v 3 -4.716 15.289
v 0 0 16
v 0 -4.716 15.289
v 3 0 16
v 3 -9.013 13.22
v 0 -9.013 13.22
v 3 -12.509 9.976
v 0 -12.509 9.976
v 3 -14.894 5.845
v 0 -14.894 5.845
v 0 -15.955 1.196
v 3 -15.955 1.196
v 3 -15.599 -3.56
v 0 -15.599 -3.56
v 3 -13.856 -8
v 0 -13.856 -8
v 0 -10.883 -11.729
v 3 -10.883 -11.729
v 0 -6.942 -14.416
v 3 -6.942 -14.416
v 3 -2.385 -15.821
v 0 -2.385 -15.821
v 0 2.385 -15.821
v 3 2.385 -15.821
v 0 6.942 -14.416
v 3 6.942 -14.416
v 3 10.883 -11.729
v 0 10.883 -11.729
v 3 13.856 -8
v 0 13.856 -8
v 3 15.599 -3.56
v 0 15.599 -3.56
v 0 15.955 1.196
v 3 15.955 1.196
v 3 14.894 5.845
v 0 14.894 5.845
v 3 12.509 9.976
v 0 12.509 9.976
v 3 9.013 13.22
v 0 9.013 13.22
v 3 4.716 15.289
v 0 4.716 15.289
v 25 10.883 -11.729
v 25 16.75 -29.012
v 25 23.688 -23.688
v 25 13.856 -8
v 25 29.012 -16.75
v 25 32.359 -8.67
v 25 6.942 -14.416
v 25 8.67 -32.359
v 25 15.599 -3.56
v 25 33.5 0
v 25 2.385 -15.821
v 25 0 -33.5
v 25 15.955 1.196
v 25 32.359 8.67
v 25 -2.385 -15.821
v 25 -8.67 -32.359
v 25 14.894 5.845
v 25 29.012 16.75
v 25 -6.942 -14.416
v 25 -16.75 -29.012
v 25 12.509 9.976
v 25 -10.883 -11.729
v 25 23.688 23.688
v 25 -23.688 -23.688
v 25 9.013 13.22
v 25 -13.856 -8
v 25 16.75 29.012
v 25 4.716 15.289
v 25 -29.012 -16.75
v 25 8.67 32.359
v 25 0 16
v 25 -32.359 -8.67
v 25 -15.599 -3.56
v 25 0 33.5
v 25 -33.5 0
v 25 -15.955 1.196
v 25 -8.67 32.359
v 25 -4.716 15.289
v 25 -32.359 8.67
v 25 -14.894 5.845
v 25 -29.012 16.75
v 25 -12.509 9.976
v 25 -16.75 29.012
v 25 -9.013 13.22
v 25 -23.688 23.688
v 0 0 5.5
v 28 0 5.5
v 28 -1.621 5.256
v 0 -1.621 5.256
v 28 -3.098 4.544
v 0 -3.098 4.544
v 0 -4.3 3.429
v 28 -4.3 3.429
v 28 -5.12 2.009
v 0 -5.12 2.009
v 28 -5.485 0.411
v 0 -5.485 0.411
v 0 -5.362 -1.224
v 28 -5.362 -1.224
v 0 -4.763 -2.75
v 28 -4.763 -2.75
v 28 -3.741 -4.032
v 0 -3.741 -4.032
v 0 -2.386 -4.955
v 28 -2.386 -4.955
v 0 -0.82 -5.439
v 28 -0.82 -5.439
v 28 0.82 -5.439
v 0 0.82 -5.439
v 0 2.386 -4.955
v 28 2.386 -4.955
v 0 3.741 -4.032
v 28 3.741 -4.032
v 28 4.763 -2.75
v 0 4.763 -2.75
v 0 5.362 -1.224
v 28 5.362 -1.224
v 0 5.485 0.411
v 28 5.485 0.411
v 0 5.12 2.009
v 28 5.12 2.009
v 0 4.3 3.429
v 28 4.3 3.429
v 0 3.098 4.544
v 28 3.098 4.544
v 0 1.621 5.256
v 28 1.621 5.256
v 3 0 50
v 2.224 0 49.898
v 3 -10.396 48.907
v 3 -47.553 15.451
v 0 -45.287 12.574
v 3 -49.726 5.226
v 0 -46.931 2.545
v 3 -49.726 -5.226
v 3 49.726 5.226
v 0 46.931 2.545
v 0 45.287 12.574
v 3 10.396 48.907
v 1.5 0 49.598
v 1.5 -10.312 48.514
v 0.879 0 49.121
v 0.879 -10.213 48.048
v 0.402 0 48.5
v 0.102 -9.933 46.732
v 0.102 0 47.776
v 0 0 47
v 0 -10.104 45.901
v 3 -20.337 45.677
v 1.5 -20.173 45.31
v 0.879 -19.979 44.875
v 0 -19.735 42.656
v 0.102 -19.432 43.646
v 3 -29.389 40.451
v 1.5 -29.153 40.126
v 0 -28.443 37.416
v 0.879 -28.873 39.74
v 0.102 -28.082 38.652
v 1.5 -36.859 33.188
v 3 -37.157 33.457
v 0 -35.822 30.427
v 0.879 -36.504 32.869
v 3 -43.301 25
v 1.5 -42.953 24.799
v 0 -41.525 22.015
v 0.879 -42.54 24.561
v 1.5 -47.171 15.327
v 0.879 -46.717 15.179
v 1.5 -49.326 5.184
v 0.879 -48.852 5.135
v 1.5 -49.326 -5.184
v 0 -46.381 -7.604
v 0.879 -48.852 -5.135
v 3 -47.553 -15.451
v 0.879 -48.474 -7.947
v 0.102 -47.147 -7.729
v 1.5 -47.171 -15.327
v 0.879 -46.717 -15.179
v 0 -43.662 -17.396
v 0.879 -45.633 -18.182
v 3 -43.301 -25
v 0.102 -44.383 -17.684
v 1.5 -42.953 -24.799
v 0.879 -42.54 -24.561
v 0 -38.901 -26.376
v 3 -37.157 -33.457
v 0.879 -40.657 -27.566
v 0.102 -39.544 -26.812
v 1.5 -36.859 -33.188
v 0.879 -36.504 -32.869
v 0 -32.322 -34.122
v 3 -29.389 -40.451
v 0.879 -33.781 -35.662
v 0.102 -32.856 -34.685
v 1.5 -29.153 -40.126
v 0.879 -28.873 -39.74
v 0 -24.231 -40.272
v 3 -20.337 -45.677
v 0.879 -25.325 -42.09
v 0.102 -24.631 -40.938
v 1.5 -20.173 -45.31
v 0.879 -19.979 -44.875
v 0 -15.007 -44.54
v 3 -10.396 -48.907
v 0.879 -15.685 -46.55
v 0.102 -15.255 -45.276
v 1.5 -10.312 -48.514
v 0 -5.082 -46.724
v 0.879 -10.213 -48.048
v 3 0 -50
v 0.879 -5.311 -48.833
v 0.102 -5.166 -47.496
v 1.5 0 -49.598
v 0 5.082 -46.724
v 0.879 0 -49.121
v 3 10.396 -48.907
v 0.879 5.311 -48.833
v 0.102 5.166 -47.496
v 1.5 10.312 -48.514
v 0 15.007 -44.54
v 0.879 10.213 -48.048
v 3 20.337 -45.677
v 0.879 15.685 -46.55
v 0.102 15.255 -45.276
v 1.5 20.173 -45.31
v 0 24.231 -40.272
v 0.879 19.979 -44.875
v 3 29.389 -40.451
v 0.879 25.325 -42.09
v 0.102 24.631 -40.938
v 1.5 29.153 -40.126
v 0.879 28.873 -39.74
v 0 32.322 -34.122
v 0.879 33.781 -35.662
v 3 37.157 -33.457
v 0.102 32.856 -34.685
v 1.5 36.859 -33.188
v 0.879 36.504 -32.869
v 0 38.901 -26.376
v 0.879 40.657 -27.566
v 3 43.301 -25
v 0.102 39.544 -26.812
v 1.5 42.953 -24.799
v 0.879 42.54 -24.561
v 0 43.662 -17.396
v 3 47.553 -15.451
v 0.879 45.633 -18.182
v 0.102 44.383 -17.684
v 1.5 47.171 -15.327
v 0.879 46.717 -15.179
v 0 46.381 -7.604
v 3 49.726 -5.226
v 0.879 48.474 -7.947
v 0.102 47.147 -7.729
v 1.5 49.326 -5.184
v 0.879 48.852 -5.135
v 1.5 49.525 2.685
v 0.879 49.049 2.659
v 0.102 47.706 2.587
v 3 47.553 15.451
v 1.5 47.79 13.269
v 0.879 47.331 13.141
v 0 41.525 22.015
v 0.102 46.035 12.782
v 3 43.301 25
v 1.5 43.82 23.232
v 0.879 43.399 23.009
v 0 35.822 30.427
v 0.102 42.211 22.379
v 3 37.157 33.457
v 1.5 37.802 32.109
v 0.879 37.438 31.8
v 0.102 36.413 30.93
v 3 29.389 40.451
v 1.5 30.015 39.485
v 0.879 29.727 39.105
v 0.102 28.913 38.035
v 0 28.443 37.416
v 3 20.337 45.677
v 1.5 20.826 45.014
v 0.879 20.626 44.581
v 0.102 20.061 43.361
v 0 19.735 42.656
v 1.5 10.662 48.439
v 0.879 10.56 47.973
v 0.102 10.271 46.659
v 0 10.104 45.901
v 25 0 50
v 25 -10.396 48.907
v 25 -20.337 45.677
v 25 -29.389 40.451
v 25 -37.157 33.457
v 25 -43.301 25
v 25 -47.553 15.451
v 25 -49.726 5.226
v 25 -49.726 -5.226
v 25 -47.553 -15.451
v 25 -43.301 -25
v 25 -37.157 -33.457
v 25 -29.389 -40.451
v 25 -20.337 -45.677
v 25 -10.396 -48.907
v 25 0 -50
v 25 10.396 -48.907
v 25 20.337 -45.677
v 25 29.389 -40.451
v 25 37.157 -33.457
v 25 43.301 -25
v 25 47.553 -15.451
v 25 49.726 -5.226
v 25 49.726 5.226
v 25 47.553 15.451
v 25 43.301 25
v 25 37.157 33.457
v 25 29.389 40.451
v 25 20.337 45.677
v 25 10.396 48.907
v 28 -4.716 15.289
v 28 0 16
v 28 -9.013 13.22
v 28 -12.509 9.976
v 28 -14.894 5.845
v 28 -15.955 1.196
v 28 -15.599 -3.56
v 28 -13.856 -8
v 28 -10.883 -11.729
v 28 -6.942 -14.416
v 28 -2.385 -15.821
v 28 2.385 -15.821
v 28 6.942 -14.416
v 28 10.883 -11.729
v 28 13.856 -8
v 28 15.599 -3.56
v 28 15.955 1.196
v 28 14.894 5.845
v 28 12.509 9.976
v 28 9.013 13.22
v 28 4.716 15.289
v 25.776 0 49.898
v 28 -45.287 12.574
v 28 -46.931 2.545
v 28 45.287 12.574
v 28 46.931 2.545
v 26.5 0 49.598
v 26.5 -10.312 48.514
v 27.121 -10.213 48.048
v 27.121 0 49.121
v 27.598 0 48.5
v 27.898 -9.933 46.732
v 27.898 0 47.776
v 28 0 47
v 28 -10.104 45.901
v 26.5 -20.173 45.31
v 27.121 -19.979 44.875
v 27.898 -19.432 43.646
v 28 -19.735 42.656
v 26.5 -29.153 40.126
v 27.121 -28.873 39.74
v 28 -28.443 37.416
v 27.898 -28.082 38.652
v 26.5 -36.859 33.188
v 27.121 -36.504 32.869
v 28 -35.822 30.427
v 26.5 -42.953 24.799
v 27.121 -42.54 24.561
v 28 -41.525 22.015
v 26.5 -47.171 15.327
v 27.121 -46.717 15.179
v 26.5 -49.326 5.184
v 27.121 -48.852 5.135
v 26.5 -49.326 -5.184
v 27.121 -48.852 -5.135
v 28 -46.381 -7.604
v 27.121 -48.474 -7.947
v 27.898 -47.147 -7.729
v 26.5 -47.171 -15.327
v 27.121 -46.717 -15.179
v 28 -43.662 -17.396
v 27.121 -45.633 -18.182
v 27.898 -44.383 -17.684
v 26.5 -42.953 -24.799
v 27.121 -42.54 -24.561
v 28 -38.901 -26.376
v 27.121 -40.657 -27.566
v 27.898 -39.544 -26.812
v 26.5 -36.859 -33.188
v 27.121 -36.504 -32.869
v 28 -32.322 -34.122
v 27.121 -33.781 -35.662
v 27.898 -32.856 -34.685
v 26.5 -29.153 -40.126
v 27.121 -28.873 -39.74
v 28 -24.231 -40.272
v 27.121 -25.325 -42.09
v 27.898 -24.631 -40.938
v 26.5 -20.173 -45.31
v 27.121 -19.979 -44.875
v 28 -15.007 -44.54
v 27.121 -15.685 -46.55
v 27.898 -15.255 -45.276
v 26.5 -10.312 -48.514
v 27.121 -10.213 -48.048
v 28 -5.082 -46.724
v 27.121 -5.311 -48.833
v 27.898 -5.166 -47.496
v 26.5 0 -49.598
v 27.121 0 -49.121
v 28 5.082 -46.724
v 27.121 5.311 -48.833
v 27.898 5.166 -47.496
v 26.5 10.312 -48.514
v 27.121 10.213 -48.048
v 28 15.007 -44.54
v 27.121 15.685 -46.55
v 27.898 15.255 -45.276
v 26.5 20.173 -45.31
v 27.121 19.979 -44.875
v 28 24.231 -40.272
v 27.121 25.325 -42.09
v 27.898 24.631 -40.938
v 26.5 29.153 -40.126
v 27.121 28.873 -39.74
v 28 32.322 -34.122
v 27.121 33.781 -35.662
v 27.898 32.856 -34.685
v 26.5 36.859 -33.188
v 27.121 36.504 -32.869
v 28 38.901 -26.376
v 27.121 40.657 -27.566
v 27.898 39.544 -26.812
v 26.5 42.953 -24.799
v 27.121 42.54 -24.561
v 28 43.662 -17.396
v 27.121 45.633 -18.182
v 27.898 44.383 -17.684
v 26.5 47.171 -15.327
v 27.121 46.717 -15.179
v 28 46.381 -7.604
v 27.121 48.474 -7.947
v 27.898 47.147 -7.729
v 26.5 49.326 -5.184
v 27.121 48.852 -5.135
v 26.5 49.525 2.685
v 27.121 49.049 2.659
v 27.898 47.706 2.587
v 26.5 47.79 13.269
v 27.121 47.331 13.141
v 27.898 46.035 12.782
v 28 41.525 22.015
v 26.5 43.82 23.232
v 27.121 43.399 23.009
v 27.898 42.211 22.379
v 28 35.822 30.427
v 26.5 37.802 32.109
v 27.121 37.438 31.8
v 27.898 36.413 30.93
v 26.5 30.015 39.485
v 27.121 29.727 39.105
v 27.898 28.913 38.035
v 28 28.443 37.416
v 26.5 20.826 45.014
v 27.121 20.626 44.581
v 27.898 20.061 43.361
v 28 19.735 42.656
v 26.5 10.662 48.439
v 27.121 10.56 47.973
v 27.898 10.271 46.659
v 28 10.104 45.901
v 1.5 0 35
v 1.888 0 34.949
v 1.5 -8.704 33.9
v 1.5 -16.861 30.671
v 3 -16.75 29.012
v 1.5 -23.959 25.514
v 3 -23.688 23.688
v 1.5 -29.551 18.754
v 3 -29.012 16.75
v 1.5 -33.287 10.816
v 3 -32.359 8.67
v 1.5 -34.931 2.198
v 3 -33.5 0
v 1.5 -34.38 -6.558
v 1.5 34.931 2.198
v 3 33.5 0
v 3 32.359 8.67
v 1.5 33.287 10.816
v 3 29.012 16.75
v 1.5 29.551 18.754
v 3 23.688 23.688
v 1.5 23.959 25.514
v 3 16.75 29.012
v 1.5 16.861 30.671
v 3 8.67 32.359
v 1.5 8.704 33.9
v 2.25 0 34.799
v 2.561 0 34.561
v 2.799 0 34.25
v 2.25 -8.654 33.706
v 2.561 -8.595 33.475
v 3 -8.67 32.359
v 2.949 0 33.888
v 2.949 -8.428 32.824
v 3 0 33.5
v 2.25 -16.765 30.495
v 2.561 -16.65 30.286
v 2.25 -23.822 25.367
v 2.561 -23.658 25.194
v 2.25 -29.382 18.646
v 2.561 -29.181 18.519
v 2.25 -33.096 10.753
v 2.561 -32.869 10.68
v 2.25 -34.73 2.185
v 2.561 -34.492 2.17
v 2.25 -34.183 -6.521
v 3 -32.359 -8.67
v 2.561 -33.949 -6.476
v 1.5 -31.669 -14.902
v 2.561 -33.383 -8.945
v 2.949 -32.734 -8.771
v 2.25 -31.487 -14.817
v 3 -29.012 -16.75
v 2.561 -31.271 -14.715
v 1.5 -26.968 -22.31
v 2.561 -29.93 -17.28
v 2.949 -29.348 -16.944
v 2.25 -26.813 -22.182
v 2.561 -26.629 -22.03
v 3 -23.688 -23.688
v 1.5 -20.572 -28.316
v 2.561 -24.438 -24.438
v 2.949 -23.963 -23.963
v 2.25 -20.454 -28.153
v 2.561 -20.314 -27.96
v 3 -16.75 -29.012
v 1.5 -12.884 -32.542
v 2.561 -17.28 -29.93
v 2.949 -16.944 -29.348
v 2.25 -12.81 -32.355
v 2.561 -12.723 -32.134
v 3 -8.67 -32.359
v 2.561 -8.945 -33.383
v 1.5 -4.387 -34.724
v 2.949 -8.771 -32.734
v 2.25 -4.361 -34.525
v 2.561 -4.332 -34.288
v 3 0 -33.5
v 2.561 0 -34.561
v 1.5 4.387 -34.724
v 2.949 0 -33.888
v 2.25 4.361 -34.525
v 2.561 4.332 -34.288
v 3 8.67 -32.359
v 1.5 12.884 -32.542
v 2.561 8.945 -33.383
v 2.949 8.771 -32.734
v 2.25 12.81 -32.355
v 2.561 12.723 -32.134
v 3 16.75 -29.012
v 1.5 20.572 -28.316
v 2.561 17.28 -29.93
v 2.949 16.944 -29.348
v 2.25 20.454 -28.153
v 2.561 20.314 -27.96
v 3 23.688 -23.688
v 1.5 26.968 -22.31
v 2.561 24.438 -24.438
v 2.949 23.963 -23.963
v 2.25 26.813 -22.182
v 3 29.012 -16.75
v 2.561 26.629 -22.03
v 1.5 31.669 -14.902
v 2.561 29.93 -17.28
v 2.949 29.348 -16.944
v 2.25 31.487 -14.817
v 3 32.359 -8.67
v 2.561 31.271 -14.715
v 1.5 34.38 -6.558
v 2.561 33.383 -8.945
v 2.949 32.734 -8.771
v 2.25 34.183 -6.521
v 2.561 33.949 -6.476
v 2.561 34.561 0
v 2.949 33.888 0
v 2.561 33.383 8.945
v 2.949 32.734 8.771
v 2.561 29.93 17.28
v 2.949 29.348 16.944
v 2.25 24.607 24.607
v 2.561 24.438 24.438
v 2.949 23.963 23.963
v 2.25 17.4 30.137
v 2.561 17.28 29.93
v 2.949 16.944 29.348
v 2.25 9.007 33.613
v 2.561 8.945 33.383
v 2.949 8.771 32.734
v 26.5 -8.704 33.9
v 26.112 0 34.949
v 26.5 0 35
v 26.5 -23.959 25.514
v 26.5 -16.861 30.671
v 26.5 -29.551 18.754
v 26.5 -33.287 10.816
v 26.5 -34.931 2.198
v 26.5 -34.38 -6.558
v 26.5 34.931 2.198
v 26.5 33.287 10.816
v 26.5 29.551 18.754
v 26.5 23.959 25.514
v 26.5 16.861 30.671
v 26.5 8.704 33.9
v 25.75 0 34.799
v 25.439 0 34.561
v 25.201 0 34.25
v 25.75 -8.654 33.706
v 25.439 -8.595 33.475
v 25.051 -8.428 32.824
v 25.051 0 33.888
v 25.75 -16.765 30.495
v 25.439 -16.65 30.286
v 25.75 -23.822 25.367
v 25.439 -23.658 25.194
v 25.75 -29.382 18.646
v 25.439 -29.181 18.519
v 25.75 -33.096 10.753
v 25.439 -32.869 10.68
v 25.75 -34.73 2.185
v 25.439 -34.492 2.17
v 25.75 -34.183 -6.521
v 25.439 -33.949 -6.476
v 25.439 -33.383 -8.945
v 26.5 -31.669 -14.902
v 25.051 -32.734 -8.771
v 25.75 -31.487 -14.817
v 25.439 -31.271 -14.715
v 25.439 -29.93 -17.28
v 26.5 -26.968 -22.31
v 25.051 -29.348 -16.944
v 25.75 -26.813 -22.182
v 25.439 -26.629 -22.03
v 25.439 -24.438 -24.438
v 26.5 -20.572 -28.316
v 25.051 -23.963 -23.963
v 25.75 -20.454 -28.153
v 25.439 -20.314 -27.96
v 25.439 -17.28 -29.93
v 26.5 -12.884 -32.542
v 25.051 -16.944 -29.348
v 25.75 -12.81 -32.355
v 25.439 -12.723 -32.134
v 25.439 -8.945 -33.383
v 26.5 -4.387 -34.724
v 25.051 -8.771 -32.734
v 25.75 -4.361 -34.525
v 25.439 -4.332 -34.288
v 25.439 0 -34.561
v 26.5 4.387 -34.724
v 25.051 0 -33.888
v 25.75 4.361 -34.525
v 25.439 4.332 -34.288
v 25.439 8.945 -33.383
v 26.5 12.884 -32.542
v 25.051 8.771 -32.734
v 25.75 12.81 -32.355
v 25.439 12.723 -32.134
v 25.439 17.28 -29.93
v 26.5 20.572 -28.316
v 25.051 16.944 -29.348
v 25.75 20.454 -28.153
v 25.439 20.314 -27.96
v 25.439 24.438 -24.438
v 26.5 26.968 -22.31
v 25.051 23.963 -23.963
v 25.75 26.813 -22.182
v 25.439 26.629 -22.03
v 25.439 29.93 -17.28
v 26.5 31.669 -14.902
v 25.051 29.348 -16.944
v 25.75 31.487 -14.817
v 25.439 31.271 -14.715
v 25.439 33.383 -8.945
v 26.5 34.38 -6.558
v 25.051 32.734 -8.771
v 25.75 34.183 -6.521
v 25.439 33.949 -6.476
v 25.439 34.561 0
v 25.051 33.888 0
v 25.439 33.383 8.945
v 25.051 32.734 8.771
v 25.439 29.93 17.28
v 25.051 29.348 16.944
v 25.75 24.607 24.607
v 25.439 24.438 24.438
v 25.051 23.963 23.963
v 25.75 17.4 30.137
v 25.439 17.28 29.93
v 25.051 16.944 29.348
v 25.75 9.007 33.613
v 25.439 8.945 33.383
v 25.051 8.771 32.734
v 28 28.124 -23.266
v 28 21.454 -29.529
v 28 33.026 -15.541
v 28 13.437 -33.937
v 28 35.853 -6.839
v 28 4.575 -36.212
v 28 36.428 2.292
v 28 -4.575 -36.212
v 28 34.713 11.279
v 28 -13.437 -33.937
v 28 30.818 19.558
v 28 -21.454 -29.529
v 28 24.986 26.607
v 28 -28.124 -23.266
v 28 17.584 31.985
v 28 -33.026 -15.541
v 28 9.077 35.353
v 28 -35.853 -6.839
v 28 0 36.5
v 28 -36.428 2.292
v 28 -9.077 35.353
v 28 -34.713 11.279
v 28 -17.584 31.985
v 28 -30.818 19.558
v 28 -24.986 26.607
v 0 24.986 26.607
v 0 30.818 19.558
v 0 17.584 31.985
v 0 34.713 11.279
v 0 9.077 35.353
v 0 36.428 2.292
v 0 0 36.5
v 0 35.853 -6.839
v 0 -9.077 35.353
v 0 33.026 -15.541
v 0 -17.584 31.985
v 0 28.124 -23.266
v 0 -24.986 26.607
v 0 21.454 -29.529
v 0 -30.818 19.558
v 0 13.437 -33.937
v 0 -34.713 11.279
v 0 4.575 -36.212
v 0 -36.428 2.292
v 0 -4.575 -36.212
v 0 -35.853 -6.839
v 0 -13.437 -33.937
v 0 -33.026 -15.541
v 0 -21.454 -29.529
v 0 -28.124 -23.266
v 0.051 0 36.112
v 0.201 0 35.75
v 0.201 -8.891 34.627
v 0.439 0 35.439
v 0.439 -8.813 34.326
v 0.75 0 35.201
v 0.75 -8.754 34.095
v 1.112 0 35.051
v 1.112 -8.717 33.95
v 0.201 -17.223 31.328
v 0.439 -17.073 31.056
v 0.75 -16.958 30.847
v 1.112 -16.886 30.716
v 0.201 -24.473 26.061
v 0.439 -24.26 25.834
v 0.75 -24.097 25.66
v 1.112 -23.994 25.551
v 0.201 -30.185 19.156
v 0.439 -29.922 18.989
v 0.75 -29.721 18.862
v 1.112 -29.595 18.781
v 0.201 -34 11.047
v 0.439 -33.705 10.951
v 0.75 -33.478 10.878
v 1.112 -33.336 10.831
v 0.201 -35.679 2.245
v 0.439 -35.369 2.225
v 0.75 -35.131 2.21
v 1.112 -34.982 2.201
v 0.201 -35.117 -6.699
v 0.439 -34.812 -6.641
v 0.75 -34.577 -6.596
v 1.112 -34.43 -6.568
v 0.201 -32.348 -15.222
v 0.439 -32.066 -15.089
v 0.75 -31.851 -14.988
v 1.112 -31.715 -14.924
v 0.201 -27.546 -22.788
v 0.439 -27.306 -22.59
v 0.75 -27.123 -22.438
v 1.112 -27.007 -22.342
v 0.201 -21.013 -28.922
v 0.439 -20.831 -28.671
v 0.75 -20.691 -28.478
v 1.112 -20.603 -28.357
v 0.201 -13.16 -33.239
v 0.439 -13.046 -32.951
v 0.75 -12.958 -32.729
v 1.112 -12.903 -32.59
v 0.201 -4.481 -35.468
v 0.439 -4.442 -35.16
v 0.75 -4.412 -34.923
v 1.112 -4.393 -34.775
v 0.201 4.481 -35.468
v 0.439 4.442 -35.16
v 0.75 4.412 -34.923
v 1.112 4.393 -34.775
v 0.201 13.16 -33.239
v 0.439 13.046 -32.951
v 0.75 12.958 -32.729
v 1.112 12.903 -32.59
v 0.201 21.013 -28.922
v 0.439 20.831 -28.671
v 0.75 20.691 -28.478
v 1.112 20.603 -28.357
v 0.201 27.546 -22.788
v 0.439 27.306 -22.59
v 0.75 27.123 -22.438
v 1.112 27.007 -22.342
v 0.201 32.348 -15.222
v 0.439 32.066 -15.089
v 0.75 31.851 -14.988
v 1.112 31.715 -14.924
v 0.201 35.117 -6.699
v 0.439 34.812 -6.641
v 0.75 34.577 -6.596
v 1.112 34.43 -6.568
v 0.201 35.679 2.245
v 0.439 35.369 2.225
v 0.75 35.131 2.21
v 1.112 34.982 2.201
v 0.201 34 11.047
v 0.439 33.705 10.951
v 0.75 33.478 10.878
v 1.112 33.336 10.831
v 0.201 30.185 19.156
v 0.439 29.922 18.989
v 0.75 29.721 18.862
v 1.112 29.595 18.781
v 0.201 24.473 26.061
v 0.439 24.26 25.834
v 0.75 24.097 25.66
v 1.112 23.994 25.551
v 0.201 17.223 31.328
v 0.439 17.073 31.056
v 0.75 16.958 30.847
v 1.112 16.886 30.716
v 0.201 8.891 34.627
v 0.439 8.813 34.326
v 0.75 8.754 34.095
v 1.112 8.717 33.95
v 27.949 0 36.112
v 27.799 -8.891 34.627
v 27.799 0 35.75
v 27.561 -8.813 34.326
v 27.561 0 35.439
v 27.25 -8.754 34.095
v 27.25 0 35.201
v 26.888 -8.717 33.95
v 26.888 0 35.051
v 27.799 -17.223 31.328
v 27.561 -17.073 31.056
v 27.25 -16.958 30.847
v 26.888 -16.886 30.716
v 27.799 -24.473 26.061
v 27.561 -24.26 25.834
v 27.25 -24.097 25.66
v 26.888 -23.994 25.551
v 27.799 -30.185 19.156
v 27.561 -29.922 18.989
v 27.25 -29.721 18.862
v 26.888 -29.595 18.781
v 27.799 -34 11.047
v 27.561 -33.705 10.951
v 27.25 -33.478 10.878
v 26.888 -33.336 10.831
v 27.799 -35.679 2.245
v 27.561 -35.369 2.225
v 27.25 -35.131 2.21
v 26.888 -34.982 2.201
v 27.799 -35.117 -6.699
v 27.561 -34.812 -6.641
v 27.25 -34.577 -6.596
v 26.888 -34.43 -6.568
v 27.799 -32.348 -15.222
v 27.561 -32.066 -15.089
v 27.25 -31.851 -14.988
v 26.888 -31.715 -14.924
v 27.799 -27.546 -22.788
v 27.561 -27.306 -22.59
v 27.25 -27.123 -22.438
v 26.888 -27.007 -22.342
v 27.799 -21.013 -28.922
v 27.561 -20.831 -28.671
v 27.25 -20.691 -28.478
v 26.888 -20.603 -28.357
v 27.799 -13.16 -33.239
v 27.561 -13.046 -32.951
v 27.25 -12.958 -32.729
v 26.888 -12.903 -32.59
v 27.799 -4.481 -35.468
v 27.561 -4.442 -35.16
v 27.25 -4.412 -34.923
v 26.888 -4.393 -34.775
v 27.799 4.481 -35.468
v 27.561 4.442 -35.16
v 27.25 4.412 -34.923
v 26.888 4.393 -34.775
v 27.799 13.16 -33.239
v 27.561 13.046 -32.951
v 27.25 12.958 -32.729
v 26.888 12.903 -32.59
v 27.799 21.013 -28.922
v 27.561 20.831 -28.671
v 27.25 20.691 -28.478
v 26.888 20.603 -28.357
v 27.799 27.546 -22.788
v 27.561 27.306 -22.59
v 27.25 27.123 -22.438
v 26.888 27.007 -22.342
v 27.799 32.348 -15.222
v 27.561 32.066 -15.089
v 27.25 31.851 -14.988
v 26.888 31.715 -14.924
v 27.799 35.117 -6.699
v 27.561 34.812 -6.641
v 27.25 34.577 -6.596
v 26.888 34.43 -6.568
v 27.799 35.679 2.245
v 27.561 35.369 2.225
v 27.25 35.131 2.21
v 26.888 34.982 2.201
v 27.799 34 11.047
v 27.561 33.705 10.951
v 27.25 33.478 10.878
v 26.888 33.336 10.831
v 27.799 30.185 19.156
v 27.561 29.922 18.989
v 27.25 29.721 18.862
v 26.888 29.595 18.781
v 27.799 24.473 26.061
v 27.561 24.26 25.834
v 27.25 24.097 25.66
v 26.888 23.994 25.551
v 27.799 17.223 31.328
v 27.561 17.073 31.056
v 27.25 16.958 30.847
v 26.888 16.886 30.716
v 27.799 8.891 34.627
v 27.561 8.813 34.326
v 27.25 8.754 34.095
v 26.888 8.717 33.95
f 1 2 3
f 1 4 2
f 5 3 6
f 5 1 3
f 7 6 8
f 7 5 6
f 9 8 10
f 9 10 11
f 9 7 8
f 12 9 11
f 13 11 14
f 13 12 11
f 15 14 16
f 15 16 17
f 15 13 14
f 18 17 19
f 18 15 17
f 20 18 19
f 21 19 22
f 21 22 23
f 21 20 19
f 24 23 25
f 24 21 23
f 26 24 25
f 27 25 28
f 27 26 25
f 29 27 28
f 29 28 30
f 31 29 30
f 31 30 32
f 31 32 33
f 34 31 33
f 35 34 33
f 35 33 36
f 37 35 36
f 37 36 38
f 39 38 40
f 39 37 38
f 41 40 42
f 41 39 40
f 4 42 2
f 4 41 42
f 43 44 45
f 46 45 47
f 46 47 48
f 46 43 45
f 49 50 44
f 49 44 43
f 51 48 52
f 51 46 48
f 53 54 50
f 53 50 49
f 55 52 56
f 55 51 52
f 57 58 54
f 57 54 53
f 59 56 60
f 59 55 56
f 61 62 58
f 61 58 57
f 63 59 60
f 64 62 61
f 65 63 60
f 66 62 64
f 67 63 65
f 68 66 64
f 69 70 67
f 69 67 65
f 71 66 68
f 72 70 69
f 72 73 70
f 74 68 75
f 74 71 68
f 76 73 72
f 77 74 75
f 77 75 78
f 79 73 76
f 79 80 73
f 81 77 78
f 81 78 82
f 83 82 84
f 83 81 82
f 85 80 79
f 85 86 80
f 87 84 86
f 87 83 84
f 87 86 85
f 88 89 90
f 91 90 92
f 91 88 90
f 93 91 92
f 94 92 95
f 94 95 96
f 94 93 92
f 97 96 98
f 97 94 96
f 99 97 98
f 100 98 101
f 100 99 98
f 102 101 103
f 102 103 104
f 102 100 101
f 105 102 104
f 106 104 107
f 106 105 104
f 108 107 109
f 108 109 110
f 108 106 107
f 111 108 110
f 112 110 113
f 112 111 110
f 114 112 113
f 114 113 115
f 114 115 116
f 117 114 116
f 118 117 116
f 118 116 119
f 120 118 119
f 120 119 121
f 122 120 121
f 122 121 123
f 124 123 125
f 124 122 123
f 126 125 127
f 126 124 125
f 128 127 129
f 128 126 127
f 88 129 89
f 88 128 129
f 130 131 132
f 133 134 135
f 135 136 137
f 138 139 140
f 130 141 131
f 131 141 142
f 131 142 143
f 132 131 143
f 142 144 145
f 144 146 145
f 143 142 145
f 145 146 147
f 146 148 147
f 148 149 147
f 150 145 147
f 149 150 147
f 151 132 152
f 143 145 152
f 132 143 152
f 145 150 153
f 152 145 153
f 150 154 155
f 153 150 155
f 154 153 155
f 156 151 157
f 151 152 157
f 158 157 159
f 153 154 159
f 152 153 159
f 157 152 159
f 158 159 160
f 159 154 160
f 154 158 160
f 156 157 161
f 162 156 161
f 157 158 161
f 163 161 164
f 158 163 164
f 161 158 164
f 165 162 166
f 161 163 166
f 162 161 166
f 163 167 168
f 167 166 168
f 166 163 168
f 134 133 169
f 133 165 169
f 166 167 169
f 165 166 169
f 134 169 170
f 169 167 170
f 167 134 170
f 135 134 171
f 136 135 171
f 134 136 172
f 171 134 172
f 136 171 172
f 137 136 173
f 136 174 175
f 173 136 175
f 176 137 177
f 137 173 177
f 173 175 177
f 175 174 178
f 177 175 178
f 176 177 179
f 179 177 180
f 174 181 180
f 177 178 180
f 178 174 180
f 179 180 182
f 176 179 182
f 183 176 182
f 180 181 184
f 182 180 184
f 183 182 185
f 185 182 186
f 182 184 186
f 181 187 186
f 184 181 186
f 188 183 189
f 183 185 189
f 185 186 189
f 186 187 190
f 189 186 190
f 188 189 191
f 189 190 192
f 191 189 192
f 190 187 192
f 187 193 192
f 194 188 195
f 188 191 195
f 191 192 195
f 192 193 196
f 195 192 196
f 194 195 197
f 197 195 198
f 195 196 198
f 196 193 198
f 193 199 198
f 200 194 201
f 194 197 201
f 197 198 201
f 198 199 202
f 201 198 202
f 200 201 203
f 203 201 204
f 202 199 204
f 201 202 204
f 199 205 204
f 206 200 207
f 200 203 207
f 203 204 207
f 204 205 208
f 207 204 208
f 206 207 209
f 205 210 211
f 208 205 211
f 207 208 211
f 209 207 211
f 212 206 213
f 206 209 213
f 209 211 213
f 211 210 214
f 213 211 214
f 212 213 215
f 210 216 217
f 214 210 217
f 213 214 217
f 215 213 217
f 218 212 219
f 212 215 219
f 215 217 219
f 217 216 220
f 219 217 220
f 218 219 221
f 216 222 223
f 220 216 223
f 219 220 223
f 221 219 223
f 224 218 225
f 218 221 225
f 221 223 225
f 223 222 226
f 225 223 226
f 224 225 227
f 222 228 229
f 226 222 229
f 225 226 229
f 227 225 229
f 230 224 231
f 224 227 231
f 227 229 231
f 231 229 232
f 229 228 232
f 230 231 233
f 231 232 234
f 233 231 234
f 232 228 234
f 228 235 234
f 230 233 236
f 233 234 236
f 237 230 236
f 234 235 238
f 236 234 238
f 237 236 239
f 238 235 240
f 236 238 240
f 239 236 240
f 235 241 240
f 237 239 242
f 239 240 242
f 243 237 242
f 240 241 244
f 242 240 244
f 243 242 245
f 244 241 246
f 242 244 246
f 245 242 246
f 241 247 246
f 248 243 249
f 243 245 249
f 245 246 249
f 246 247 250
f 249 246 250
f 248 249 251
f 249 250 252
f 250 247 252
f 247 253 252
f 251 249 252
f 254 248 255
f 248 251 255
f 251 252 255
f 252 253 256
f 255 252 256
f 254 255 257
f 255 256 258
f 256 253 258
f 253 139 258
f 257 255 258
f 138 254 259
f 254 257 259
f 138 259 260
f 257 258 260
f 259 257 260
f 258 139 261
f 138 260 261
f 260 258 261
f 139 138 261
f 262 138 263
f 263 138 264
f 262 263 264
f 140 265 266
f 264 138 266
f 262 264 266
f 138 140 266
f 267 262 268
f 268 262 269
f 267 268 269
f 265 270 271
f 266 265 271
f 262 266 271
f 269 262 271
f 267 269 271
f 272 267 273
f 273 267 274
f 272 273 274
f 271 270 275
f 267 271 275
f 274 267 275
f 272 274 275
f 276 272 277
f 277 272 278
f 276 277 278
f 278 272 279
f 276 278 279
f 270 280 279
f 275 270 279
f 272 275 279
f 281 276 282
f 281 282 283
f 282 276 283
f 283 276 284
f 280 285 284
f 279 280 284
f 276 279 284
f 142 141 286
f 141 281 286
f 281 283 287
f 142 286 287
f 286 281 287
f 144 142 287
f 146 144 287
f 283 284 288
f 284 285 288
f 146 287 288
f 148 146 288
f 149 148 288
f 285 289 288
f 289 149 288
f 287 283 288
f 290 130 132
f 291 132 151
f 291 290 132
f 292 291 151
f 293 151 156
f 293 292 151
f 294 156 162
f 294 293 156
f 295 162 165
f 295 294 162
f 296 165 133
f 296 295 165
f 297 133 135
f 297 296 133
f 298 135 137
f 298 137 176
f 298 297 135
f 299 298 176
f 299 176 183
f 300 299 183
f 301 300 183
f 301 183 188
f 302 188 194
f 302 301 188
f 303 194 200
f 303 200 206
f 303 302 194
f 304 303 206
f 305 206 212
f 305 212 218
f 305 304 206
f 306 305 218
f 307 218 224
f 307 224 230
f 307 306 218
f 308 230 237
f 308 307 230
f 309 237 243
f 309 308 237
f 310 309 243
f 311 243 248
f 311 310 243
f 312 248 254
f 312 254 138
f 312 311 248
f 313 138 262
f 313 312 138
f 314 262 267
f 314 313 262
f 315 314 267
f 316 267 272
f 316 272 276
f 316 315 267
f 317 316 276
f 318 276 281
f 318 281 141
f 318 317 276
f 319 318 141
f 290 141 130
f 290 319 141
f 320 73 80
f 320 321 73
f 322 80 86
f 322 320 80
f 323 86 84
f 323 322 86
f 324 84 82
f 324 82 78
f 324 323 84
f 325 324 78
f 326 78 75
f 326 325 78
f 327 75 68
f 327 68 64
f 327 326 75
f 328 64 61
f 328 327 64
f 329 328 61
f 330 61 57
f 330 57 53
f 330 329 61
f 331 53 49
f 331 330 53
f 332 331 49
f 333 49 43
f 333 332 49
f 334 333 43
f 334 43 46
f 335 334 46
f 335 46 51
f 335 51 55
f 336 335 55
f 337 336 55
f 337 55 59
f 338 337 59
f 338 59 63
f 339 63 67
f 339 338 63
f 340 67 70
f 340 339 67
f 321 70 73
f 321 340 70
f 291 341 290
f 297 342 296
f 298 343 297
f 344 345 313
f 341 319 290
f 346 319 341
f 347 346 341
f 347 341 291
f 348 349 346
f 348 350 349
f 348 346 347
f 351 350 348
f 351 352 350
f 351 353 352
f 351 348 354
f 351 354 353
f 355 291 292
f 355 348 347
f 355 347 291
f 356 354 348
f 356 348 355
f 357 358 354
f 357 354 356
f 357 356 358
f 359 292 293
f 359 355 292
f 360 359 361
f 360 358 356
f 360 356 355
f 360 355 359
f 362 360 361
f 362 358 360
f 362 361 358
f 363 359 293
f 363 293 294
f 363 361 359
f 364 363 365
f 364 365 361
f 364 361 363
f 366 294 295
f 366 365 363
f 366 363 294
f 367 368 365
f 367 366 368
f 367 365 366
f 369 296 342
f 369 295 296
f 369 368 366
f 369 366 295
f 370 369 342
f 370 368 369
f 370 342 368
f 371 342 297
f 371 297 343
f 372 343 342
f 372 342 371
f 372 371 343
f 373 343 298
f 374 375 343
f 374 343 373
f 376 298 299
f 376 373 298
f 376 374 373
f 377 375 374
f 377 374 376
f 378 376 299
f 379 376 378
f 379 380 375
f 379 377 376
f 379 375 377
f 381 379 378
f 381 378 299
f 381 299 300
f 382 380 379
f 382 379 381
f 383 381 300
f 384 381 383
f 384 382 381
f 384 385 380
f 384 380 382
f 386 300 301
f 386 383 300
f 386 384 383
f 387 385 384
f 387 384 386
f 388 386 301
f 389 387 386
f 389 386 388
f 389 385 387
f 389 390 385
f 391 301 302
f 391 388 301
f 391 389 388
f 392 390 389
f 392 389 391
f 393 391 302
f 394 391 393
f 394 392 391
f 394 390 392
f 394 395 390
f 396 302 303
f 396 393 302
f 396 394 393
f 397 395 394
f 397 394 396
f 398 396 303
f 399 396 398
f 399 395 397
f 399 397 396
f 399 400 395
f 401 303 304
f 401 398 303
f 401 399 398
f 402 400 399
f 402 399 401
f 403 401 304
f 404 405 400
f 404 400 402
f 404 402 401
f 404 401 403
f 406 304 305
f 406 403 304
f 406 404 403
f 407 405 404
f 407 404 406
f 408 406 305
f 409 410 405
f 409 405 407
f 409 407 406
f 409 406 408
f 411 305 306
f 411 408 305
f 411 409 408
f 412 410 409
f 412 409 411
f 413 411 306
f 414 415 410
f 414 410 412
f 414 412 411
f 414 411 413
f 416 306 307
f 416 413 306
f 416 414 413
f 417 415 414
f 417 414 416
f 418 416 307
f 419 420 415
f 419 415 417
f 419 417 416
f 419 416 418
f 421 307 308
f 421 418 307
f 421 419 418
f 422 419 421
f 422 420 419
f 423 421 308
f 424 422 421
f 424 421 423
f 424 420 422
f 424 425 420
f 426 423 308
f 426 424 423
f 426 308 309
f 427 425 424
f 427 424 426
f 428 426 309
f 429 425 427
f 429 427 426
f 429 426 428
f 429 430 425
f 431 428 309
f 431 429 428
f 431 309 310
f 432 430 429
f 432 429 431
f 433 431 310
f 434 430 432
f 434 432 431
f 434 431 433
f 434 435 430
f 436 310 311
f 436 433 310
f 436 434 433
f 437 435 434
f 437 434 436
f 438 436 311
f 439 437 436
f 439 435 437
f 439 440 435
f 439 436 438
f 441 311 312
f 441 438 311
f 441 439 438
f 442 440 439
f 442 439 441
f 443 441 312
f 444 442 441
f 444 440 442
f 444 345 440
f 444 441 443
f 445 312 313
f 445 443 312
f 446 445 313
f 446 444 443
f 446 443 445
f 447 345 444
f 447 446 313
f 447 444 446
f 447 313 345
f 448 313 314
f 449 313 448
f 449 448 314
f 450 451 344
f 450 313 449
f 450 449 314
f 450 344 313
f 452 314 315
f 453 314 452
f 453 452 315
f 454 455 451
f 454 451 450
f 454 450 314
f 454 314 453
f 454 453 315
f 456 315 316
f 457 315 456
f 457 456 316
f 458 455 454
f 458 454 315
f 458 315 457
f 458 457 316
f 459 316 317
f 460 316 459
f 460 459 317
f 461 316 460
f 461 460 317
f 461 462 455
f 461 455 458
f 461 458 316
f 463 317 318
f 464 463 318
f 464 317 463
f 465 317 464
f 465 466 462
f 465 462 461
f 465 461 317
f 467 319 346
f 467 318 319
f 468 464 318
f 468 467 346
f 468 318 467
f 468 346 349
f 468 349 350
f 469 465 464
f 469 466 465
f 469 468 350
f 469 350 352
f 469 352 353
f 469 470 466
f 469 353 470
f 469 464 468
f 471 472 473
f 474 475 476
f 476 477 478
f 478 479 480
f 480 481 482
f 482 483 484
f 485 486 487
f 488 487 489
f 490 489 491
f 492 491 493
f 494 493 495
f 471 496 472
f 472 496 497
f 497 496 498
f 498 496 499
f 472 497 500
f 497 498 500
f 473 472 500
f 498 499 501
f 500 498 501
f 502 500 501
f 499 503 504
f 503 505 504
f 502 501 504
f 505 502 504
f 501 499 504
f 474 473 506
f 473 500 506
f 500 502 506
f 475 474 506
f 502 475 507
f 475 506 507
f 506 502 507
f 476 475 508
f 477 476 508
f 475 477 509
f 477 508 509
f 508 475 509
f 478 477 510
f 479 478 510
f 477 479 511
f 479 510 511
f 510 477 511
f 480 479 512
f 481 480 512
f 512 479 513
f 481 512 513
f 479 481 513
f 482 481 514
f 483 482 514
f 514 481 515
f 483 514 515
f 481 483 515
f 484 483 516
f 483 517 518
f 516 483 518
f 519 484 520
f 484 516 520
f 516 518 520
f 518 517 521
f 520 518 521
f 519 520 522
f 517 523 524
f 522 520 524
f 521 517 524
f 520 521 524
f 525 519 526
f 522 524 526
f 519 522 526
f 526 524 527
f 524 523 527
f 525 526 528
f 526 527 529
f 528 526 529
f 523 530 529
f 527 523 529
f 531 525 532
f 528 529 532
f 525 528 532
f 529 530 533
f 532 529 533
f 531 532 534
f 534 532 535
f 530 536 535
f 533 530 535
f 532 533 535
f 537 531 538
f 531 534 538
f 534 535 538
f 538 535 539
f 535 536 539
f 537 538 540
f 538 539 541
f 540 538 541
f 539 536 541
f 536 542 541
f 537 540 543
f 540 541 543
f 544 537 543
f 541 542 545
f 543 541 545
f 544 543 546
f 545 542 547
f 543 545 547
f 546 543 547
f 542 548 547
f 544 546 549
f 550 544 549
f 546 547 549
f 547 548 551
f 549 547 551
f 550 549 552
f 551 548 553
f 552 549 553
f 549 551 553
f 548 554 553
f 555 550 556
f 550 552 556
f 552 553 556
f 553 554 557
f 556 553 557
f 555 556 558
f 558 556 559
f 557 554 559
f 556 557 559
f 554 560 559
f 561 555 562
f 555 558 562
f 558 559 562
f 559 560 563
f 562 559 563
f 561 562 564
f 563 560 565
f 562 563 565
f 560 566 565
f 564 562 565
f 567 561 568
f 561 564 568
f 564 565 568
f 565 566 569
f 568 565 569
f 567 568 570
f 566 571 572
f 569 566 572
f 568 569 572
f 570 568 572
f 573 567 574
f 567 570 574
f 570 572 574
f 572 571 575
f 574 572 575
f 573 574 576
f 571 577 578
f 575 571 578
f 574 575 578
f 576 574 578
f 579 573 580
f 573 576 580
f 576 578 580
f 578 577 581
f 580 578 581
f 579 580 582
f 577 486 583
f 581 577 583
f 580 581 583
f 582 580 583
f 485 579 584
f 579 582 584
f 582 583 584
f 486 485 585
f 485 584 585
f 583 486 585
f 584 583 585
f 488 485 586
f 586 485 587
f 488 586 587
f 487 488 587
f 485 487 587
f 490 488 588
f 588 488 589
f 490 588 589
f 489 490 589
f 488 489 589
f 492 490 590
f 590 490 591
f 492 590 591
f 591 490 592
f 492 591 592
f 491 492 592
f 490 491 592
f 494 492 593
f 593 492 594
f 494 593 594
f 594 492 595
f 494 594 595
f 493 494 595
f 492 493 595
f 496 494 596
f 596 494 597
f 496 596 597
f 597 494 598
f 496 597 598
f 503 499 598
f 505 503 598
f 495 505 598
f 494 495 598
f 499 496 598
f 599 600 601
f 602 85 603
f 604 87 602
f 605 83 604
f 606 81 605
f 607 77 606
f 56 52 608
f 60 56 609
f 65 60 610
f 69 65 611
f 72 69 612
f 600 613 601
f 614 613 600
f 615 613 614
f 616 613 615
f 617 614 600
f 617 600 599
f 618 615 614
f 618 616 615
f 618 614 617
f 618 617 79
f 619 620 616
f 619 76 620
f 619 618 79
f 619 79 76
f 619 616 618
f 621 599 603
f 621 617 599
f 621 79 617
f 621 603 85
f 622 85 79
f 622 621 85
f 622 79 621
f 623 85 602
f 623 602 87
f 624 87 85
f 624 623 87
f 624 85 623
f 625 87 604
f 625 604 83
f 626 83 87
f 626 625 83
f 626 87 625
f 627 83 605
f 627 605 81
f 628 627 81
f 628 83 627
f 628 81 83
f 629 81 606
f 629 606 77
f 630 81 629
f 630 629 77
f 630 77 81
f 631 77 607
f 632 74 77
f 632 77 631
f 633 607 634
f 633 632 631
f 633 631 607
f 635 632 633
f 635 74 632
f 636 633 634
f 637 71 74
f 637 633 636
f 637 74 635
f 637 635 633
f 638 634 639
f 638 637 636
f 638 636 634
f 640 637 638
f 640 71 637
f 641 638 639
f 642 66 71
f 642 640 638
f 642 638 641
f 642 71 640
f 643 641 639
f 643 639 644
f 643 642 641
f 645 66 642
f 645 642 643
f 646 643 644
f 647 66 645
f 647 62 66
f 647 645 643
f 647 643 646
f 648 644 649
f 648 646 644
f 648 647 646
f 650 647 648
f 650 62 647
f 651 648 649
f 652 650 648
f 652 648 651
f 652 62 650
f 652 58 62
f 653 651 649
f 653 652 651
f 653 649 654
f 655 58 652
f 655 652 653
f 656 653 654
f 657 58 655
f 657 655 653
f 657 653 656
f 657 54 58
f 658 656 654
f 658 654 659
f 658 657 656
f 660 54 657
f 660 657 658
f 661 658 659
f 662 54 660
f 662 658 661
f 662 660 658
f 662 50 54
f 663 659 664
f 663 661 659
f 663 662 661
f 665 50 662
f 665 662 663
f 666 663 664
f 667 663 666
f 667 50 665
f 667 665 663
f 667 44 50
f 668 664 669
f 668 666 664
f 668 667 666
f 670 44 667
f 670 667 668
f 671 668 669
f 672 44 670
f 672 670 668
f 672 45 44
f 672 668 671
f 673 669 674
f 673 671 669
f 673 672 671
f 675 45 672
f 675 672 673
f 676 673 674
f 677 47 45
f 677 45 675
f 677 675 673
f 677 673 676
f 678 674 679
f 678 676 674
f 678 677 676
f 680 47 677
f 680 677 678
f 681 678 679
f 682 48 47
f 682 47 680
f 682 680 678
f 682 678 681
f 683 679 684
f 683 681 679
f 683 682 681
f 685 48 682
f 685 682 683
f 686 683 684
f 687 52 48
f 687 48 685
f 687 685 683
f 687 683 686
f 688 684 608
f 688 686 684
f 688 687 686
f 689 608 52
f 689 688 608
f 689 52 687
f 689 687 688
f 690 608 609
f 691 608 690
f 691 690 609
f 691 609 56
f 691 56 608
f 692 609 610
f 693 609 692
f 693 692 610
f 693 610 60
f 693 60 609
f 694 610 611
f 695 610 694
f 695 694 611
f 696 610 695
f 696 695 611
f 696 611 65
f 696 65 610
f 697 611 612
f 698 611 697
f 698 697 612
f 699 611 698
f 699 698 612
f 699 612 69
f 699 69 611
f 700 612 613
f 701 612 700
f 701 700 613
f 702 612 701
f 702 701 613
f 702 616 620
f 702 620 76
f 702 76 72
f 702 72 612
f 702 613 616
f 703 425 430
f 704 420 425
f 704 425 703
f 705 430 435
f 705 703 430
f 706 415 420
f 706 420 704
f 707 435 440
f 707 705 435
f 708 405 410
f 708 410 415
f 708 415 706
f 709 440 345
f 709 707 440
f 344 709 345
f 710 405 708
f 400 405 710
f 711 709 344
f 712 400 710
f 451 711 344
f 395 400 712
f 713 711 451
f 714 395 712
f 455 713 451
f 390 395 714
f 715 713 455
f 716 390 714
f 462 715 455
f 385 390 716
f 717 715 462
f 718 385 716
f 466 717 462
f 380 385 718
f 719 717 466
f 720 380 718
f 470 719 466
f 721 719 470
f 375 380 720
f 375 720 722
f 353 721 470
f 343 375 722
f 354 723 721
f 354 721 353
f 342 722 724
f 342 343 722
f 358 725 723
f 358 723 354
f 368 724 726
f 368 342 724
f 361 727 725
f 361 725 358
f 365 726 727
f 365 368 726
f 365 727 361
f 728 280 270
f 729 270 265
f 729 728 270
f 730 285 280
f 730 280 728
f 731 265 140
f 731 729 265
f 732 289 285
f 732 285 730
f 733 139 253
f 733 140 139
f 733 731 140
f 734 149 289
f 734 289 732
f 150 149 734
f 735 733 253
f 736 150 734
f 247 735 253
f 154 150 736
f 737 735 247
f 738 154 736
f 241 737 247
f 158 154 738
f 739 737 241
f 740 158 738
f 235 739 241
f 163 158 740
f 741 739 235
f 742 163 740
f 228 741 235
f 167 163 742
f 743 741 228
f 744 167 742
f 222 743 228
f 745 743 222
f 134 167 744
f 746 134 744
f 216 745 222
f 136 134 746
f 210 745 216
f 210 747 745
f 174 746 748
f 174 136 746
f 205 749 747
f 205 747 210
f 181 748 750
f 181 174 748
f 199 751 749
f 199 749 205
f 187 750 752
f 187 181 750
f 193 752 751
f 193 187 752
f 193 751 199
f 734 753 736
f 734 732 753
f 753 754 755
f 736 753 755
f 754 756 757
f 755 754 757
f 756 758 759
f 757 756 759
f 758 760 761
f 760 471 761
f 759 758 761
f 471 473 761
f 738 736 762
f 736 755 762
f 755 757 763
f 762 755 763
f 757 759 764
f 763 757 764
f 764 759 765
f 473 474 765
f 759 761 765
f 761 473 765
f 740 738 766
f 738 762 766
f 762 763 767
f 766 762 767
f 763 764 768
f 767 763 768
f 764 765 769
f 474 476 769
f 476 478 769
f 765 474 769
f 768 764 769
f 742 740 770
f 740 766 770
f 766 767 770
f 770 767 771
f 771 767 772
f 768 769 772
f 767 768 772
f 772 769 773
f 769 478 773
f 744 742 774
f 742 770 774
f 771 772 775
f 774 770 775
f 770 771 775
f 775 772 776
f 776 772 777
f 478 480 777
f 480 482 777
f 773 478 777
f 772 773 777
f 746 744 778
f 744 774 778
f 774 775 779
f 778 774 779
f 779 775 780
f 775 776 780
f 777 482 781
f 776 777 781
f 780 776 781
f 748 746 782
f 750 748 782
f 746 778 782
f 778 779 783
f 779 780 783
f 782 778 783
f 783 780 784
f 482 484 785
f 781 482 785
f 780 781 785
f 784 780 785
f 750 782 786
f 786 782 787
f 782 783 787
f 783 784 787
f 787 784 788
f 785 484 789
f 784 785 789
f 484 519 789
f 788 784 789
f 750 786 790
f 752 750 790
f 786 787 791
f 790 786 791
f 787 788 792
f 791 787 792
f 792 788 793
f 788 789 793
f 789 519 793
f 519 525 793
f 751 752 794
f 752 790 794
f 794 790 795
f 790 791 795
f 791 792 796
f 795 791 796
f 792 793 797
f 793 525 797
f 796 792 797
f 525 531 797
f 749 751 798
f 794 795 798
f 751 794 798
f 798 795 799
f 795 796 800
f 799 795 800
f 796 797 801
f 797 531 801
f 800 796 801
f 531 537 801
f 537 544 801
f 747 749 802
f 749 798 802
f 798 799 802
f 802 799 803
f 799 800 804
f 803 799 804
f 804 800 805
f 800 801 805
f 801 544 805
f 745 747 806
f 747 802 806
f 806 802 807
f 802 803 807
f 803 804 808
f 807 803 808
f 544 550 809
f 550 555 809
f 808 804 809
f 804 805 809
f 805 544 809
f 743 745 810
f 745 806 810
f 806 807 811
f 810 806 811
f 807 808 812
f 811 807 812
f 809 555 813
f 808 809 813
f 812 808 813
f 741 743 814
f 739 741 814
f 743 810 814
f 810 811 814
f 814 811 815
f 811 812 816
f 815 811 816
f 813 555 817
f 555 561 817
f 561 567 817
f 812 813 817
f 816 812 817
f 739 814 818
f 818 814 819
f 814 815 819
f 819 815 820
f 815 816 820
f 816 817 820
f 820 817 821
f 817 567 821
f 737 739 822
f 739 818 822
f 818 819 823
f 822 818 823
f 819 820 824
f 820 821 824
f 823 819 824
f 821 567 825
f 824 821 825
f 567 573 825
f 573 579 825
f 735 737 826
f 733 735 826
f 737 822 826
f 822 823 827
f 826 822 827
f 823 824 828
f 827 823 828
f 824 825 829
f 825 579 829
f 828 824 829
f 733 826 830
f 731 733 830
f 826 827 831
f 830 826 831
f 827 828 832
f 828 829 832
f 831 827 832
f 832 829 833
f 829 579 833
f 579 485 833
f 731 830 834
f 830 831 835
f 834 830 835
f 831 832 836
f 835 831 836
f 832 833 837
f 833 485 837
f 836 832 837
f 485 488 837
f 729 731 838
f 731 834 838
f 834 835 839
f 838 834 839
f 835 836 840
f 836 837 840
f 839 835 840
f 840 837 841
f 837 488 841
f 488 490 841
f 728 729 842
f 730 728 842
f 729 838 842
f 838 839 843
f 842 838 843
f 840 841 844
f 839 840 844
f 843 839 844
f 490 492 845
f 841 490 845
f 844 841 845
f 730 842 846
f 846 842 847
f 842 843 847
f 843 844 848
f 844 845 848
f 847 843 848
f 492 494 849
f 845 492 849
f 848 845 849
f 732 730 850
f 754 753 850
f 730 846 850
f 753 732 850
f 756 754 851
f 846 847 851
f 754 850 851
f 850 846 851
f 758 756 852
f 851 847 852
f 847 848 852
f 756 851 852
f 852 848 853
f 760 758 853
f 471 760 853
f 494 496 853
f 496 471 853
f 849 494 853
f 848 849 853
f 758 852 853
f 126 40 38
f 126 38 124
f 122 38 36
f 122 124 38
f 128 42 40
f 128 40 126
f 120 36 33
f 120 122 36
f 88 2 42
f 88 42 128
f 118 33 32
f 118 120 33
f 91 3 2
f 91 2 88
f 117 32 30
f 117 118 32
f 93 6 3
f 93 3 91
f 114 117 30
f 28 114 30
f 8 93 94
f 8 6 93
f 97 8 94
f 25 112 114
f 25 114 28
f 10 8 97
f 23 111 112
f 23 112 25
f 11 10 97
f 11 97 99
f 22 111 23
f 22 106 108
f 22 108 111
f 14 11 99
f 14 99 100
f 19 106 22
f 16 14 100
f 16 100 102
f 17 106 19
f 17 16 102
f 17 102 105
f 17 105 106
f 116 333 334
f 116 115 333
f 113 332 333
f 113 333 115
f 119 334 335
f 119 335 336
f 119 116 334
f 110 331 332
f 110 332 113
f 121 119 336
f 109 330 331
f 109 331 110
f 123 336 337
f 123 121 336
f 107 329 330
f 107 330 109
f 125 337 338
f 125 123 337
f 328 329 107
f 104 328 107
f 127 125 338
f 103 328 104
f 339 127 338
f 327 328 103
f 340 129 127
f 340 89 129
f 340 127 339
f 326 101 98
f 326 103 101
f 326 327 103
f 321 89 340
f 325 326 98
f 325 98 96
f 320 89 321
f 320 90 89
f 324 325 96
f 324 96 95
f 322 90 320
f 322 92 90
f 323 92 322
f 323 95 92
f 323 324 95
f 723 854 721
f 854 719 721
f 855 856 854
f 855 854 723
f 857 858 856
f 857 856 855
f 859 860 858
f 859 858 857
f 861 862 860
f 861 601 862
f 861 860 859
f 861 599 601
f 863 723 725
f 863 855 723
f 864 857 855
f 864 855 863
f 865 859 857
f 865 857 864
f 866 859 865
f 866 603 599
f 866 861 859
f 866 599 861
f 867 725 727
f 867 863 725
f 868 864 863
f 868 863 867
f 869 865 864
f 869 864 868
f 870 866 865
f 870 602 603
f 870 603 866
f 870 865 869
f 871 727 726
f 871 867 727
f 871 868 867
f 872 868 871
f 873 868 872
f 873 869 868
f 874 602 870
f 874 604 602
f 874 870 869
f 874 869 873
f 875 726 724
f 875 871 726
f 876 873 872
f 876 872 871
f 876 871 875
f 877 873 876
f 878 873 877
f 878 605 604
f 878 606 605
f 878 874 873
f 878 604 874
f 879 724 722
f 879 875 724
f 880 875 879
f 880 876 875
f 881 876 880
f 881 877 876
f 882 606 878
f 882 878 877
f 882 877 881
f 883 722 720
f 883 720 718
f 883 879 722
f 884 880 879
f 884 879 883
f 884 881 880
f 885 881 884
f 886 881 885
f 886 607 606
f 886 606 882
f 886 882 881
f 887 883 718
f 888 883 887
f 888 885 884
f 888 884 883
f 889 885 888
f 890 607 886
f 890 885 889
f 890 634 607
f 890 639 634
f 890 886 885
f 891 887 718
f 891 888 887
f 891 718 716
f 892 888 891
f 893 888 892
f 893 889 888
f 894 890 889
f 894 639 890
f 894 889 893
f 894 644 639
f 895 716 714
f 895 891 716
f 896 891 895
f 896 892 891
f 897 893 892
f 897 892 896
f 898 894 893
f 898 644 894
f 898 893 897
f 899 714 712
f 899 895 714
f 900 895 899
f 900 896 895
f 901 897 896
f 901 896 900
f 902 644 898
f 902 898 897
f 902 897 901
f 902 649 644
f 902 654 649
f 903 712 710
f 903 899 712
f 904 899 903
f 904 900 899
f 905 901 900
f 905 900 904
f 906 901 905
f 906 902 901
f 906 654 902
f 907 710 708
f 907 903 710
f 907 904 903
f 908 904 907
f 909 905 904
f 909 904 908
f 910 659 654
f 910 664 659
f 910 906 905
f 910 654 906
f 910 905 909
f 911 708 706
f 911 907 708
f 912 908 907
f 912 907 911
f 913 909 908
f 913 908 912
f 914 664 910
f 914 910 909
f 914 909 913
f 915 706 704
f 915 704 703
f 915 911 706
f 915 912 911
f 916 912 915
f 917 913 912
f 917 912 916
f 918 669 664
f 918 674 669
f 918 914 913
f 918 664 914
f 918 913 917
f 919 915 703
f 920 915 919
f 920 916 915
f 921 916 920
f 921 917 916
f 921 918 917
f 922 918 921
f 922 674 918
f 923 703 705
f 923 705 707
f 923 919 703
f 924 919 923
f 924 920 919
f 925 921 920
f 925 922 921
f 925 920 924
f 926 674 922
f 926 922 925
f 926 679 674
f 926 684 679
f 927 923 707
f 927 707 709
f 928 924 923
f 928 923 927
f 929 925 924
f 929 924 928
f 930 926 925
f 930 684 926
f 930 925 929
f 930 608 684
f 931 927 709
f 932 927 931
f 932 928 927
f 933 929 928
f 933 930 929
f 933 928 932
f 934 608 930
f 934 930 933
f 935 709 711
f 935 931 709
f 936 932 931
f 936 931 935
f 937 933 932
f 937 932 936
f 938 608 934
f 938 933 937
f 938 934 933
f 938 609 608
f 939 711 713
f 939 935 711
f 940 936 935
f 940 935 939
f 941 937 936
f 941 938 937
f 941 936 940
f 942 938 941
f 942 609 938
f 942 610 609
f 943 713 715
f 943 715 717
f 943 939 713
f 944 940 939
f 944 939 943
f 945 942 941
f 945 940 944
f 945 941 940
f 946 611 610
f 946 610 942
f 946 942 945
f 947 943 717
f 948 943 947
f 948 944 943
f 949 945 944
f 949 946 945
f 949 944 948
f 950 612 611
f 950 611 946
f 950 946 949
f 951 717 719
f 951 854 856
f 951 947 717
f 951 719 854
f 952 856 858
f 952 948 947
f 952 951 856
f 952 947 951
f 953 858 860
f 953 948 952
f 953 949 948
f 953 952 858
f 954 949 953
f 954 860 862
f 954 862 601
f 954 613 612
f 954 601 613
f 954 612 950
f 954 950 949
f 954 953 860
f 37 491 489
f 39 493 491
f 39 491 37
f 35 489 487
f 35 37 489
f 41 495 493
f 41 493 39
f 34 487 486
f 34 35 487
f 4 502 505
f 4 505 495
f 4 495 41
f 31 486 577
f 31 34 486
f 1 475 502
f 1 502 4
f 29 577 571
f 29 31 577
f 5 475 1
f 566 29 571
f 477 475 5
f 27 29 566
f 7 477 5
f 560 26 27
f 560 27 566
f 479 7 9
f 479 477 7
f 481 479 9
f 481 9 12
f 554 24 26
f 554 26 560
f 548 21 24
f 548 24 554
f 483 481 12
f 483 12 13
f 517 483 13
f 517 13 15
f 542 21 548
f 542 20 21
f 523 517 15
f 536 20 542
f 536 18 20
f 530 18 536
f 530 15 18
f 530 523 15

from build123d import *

# Parameters (mm, degrees)
FILLET1_R = 3
FILLET2_R = 1.5


with BuildPart() as part:
    # Sketch1 → Revolve1 (revolve)
    with BuildSketch(Plane.XY, mode=Mode.PRIVATE) as revolve1_sk:
        Polygon((0, 50), (28, 50), (28, 35), (25, 35), (25, 16), (28, 16), (28, 5.5), (0, 5.5), (0, 16), (3, 16), (3, 35), (0, 35), align=None)
    revolve(revolve1_sk.sketch.rotate(Axis((0, 0, 0), (1, 0, 0)), 90), axis=Axis((0, 0, 0), (1, 0, 0)))

    # Fillet1
    fillet1_edges = [part.edges().sort_by_distance(p)[0] for p in [
        (28, 0, -50),
        (0, 0, -50),
    ]]
    fillet(fillet1_edges, radius=FILLET1_R)

    # Fillet2
    fillet2_edges = [part.edges().sort_by_distance(p)[0] for p in [
        (25, 0, -35),
        (28, 0, -35),
        (0, 0, -35),
        (3, 0, -35),
    ]]
    fillet(fillet2_edges, radius=FILLET2_R - 0.0001)  # a hair under: the kernel refuses the full size


solid = part.part
